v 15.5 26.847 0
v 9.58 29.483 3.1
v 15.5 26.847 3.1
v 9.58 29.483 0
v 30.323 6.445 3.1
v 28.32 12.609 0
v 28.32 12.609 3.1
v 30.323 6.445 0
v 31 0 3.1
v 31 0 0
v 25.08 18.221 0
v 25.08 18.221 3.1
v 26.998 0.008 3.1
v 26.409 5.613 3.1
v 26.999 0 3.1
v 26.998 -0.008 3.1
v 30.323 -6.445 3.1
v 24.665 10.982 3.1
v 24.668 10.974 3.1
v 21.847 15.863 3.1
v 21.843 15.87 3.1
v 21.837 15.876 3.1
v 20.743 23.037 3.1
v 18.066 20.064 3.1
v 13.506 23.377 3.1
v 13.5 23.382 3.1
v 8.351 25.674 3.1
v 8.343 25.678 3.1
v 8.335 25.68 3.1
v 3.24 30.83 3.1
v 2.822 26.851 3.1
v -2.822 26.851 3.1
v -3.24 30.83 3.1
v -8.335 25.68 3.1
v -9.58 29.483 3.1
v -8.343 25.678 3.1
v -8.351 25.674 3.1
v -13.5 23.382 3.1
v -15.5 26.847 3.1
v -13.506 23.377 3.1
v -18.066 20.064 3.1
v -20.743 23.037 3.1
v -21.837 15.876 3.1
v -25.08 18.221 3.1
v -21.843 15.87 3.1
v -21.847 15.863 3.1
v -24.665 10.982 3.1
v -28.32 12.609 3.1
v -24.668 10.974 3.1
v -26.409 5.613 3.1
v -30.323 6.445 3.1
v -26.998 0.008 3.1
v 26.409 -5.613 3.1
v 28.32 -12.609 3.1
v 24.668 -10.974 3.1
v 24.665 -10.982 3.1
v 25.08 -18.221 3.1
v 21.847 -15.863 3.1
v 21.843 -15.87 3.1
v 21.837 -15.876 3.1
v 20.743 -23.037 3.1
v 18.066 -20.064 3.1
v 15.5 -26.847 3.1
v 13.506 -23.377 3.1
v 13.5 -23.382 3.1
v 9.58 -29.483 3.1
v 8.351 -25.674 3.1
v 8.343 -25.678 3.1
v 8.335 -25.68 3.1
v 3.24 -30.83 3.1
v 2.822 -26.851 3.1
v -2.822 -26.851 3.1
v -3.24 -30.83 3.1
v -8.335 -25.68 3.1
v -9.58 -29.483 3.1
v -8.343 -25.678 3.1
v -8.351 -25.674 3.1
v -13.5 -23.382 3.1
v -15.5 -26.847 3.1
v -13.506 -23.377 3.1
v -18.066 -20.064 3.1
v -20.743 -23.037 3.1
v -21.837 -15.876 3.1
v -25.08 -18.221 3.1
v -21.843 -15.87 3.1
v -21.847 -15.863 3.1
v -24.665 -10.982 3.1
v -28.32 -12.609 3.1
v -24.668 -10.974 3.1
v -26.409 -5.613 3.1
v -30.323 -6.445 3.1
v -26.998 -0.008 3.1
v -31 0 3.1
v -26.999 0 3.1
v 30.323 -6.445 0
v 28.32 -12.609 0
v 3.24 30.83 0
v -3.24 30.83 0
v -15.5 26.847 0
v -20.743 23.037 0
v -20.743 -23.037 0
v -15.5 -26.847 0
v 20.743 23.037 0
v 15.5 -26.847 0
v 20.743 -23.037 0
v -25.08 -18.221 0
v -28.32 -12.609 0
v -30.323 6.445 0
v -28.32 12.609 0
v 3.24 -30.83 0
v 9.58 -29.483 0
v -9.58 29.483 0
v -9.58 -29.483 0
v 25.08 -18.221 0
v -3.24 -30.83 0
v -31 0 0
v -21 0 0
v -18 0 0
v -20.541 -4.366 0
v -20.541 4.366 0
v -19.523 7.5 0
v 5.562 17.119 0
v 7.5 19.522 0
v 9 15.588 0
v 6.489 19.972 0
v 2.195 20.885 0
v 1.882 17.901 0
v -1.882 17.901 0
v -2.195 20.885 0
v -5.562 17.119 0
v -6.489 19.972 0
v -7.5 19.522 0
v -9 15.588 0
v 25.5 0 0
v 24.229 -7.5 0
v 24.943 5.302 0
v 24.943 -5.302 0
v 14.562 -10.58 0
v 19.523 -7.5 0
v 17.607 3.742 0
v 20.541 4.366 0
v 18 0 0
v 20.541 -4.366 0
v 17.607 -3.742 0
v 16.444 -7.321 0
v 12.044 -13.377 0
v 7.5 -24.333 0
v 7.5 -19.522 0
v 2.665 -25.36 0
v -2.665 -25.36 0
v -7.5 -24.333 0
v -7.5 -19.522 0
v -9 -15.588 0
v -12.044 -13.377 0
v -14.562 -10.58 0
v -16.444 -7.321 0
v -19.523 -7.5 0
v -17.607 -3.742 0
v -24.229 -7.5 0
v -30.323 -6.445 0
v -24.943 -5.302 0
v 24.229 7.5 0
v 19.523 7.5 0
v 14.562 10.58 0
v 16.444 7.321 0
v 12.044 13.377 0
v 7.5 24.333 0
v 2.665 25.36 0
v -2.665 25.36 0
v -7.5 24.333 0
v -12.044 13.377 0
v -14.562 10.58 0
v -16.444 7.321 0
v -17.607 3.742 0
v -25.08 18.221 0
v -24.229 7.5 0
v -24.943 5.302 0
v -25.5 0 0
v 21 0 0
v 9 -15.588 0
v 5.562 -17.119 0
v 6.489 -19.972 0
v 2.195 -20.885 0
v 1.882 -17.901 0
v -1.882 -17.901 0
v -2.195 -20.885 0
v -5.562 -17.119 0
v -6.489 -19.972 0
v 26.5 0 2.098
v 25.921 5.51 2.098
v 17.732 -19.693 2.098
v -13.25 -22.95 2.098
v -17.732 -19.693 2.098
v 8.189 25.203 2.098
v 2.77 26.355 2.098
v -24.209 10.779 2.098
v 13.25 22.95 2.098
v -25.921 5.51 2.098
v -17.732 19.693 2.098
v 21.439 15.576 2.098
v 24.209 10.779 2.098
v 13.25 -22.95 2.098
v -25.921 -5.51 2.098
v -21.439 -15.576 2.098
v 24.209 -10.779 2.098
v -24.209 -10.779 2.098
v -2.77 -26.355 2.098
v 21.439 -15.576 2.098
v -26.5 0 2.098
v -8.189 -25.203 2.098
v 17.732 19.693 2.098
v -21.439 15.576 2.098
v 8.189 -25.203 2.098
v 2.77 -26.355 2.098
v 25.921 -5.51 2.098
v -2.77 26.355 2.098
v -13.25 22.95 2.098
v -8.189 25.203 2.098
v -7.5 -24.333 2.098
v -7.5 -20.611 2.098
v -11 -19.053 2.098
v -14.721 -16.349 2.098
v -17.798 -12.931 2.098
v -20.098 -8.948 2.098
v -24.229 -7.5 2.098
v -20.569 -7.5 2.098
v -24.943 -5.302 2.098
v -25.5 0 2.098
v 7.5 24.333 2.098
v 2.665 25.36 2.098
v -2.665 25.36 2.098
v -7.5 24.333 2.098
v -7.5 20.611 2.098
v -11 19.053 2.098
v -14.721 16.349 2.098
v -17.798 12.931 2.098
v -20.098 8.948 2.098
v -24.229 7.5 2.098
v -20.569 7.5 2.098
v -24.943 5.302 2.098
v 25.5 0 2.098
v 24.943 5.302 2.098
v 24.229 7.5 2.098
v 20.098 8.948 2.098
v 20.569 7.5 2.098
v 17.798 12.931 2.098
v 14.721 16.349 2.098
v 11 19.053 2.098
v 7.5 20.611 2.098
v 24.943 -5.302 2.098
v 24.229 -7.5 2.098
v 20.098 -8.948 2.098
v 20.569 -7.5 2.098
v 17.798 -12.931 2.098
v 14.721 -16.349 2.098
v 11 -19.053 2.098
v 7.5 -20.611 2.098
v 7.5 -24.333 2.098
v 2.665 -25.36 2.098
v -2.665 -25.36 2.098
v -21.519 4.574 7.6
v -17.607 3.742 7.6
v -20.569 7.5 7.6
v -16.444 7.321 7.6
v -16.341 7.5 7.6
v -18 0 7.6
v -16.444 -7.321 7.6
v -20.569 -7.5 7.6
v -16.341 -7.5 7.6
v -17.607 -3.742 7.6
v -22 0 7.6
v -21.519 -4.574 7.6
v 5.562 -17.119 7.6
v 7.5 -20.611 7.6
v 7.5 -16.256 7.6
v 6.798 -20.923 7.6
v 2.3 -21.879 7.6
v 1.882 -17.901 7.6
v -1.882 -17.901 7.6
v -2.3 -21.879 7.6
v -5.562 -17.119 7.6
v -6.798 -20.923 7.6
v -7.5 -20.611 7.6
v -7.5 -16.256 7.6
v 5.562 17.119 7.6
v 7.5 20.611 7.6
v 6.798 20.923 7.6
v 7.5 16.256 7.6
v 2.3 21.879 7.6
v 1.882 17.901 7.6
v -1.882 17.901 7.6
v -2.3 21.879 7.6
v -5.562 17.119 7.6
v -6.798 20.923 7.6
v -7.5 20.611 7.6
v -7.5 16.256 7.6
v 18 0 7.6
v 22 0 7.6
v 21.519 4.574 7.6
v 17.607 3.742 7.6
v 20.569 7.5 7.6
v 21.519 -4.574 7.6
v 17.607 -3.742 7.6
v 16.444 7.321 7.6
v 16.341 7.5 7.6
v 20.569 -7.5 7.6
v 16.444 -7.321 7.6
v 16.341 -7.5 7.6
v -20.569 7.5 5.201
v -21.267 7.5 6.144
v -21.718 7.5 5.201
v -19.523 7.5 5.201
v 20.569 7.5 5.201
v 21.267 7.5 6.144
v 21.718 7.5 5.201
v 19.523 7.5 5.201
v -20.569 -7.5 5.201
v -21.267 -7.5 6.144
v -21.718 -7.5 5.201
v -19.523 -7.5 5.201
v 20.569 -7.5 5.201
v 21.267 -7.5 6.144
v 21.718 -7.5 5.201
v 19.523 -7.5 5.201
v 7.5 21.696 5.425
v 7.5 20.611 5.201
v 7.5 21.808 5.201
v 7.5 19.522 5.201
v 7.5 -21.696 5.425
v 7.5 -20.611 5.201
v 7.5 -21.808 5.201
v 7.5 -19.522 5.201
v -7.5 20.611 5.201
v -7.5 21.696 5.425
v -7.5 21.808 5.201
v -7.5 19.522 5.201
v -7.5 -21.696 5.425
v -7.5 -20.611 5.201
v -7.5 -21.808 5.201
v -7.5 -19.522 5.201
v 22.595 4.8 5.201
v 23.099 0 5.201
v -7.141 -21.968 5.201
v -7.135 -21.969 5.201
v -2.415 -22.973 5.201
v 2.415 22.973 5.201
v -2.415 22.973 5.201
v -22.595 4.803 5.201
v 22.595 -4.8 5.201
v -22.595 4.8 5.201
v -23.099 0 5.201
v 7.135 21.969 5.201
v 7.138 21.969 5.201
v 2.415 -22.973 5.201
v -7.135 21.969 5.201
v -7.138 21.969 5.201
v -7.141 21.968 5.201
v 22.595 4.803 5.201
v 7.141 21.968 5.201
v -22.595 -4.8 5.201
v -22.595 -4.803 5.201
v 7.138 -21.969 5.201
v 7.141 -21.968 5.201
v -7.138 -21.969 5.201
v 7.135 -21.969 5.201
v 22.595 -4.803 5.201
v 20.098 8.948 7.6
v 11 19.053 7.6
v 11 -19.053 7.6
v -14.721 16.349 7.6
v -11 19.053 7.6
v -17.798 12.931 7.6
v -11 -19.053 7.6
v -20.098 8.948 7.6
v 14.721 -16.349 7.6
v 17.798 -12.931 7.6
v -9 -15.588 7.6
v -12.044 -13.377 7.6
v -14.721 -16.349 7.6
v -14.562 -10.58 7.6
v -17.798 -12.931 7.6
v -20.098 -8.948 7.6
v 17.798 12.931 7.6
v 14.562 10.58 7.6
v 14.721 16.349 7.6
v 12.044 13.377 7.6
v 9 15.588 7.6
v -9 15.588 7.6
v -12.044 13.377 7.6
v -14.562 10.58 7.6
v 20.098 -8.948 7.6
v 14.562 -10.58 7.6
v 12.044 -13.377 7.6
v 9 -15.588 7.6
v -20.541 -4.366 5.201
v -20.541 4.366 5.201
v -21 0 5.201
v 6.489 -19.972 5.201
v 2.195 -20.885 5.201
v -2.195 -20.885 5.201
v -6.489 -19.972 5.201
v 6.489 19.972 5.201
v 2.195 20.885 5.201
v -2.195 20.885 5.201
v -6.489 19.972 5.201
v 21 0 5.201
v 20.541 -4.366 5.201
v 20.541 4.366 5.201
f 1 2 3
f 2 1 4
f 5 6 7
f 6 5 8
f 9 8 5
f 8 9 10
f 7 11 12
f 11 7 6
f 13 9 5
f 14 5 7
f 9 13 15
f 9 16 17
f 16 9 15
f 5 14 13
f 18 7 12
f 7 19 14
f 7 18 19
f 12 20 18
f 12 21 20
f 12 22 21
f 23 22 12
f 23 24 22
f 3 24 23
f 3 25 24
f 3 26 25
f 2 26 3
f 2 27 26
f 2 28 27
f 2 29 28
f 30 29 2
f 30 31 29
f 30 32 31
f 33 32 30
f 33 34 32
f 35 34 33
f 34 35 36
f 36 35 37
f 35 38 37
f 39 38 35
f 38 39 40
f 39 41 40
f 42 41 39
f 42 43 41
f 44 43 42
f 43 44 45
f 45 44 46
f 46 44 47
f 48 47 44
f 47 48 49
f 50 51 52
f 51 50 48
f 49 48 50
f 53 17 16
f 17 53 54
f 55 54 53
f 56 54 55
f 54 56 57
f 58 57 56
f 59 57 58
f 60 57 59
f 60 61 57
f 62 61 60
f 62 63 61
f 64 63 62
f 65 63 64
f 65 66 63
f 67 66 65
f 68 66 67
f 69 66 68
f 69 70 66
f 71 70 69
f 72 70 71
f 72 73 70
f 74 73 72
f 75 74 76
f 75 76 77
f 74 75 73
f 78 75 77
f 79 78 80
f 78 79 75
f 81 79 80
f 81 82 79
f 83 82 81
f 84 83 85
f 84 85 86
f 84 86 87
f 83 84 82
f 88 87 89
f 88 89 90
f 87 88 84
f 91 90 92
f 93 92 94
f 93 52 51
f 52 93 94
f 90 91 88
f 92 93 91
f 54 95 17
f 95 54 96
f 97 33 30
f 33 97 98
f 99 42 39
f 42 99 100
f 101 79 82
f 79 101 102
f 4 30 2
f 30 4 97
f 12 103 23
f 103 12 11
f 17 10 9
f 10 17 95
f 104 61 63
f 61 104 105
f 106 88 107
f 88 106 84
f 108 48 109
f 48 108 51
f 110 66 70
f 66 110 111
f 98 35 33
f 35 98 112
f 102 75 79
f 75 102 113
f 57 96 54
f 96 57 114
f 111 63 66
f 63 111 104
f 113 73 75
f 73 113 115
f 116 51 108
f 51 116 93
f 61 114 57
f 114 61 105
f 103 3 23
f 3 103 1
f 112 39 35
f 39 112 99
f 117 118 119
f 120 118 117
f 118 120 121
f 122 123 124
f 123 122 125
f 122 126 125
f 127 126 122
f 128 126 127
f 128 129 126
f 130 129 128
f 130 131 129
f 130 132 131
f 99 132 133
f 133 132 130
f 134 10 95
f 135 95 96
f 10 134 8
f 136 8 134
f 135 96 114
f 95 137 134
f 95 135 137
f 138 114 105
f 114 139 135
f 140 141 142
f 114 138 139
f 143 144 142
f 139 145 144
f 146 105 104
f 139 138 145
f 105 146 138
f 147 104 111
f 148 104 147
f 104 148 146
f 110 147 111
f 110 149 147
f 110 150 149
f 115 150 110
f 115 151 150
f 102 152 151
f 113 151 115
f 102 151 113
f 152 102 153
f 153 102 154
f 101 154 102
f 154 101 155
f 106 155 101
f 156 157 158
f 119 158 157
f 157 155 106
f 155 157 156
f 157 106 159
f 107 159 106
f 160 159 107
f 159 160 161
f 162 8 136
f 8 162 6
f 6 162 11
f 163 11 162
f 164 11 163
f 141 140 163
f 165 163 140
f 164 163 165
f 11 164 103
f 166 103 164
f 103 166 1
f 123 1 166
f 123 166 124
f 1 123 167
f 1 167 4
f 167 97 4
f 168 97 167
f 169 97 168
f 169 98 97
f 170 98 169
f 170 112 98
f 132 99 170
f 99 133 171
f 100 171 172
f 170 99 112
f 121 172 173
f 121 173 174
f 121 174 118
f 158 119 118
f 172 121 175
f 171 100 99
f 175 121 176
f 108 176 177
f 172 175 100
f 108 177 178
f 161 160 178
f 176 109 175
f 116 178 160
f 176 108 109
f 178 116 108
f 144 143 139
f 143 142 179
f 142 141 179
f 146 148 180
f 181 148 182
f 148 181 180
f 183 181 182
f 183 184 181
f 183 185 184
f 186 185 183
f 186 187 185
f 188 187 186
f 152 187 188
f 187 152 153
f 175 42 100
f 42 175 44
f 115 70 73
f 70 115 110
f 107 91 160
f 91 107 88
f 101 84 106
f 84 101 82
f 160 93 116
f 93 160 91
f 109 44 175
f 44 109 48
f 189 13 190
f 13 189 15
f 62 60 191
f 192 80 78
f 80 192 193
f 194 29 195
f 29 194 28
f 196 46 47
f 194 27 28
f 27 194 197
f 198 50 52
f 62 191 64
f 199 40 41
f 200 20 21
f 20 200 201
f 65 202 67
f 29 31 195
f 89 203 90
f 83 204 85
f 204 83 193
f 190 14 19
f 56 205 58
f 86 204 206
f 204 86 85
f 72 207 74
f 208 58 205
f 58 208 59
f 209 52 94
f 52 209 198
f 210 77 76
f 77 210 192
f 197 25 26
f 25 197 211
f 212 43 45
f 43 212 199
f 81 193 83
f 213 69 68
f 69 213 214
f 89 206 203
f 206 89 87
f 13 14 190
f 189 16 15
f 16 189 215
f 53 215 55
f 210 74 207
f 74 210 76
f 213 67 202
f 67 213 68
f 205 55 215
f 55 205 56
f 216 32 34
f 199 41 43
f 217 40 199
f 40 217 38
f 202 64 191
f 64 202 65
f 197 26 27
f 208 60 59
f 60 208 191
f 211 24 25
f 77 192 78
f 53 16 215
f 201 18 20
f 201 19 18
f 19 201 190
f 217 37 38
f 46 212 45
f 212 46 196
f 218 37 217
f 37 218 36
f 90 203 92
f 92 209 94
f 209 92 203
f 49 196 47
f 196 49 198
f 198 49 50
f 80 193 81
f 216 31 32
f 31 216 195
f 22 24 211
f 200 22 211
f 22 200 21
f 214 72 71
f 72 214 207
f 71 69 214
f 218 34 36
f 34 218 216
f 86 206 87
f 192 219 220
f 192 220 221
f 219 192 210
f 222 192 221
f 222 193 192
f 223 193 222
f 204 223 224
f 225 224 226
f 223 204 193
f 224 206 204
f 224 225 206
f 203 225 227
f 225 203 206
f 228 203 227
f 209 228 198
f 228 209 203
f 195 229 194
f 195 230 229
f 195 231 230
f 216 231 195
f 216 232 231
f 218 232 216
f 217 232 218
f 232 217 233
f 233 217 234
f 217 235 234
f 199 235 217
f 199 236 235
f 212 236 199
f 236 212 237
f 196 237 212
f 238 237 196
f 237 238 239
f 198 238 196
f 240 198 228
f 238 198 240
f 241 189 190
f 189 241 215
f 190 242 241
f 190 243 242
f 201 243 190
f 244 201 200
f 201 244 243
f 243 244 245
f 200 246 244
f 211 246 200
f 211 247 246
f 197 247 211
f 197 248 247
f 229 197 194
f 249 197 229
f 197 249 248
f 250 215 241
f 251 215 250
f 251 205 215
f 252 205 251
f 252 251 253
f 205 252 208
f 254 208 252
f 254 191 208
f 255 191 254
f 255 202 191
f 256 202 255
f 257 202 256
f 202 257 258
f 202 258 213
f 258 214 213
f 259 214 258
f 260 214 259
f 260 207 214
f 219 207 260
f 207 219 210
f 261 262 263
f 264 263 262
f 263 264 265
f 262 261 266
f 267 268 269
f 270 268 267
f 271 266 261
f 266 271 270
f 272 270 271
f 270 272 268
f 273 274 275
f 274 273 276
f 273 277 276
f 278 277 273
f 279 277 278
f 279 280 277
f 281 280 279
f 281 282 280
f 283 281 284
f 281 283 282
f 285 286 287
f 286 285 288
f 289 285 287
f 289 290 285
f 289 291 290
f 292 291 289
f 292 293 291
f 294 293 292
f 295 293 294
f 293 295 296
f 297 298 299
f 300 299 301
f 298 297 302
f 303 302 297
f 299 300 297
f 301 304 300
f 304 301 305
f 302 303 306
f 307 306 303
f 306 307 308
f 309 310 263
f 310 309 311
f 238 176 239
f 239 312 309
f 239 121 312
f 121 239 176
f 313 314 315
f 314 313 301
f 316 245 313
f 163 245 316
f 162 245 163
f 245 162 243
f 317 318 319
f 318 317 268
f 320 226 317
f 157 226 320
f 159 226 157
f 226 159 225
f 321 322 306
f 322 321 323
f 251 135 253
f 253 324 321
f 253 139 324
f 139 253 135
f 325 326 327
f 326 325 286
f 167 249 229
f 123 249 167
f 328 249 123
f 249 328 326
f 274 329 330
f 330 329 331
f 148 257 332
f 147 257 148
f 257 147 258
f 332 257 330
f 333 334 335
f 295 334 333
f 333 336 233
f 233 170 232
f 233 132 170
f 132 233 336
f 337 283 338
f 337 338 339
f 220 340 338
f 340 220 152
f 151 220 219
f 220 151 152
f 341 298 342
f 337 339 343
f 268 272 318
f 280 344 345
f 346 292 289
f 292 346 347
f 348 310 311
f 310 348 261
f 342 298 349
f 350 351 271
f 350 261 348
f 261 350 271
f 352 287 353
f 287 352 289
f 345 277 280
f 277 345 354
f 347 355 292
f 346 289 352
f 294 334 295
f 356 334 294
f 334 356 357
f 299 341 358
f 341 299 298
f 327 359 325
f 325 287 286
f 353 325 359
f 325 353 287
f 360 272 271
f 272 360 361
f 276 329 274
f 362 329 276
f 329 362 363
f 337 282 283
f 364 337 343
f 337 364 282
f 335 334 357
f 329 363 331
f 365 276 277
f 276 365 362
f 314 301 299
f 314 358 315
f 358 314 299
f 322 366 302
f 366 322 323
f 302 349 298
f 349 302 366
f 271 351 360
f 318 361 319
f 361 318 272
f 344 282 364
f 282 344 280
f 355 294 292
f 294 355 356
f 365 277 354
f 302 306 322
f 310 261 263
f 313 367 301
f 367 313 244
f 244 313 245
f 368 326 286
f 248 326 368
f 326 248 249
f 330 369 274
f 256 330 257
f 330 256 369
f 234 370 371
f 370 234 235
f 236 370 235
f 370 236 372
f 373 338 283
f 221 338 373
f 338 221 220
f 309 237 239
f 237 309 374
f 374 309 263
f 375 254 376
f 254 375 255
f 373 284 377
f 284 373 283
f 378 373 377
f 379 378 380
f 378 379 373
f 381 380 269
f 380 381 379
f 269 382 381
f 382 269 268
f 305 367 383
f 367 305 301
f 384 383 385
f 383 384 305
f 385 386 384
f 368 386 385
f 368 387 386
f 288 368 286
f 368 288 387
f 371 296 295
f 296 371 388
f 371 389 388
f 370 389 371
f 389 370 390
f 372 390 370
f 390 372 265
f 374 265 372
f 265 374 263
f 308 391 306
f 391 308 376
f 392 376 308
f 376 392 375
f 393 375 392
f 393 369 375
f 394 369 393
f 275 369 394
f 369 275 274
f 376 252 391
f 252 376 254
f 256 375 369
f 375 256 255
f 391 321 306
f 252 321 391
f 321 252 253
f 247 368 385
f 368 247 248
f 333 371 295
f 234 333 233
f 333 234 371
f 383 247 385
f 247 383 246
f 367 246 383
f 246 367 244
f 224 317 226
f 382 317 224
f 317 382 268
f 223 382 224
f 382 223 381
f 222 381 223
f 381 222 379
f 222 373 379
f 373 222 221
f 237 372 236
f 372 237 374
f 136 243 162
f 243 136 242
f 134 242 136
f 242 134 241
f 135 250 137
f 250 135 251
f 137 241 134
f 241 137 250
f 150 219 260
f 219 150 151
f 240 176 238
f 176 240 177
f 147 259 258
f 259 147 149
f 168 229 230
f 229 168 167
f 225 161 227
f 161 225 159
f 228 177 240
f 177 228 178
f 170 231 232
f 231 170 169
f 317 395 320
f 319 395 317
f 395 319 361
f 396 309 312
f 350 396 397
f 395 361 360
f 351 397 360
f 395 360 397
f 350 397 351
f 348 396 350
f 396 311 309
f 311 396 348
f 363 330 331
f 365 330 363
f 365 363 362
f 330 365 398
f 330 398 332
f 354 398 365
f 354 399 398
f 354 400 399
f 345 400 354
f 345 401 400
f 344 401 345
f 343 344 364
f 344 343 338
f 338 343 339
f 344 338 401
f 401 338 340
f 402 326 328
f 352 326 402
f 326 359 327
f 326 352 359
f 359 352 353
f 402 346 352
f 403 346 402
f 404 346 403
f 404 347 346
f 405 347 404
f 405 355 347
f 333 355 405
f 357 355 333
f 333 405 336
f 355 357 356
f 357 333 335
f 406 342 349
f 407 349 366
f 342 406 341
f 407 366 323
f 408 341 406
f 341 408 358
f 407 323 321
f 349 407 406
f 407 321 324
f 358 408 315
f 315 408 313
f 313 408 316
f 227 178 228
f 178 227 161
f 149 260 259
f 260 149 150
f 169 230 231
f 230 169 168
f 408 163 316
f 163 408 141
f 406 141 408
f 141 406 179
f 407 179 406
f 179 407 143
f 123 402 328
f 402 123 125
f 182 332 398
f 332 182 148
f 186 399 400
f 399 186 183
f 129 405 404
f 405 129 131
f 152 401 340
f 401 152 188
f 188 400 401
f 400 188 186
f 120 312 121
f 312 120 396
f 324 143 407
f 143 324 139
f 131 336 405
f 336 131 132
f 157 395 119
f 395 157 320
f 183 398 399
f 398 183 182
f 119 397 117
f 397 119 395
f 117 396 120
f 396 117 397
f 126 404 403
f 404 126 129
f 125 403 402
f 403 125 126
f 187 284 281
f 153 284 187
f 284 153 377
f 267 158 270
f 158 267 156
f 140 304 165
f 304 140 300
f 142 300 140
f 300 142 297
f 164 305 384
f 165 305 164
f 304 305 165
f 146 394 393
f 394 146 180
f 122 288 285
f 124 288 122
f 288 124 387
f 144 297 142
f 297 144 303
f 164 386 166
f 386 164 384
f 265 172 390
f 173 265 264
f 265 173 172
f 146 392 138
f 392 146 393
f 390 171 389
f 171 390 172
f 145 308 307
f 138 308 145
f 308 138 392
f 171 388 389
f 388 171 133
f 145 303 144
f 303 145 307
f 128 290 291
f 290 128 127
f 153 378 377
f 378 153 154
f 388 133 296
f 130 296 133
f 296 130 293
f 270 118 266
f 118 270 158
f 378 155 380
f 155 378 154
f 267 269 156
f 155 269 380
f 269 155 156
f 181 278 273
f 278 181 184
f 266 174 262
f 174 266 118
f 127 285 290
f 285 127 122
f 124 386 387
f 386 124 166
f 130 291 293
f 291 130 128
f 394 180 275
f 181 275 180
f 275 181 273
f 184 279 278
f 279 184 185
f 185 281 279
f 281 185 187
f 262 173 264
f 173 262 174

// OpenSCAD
fiddle = 0.003;

baseWidth = 31;
baseHeight = 3.1;
baseTroughHeight = 1;

innerWidth = 22;
innerHoleWidth = 18;
innerHeight = 7.6;

toothHeight = 2.4;
toothWidth = 1.1;
toothBredth = 7.5;

baseTroughWidth = (innerWidth + (baseWidth - innerWidth)/2);

quadHoleHeight = innerHeight - toothHeight;
quadHoleInnerRadius = innerWidth - 1;
quadHoleOuterRadius = baseTroughWidth - 1;

difference() {
	union() {
		difference() {
			translate([0, 0, baseHeight/2]) {
				cylinder(h = baseHeight, r = baseWidth, center = true);
			}
			translate ([0, 0, baseHeight - (baseTroughHeight/2)]) {
				cylinder(h = baseTroughHeight+fiddle, r1 = baseTroughWidth, r2 = 27, center = true);
			}
		}
		translate ([0,0,innerHeight/2]) {
			cylinder(h = innerHeight, r = innerWidth, center = true);
		}
		translate ([0, 0, innerHeight - toothHeight/2]) {
			difference() {
				intersection() {
					cylinder(toothHeight, innerWidth+toothWidth, innerWidth, true);
					union() {
						cube([(innerWidth + toothWidth) * 2, toothBredth * 2, toothHeight], true);
						cube([toothBredth * 2, (innerWidth + toothWidth) * 2, toothHeight], true);
		
					}
		
		        }
				cylinder(innerHeight, innerHoleWidth, center = true);
		    }
		}
	}
	translate([0, 0, innerHeight/2]) {
		cylinder(h = innerHeight+fiddle, r = innerHoleWidth, center=true);
	}
			translate ([0, 0, quadHoleHeight/2]) {
				intersection() {
					difference() {
						cylinder(quadHoleHeight+fiddle, r = quadHoleOuterRadius, center=true);
						cylinder(quadHoleHeight+fiddle, r = quadHoleInnerRadius, center=true);
					}
					union() {
						cube([quadHoleOuterRadius*2, toothBredth * 2, quadHoleHeight+2*fiddle], true);
						cube([toothBredth * 2, quadHoleOuterRadius*2, quadHoleHeight+2*fiddle], true);
		
					}
		
		        }
			}
	
}
